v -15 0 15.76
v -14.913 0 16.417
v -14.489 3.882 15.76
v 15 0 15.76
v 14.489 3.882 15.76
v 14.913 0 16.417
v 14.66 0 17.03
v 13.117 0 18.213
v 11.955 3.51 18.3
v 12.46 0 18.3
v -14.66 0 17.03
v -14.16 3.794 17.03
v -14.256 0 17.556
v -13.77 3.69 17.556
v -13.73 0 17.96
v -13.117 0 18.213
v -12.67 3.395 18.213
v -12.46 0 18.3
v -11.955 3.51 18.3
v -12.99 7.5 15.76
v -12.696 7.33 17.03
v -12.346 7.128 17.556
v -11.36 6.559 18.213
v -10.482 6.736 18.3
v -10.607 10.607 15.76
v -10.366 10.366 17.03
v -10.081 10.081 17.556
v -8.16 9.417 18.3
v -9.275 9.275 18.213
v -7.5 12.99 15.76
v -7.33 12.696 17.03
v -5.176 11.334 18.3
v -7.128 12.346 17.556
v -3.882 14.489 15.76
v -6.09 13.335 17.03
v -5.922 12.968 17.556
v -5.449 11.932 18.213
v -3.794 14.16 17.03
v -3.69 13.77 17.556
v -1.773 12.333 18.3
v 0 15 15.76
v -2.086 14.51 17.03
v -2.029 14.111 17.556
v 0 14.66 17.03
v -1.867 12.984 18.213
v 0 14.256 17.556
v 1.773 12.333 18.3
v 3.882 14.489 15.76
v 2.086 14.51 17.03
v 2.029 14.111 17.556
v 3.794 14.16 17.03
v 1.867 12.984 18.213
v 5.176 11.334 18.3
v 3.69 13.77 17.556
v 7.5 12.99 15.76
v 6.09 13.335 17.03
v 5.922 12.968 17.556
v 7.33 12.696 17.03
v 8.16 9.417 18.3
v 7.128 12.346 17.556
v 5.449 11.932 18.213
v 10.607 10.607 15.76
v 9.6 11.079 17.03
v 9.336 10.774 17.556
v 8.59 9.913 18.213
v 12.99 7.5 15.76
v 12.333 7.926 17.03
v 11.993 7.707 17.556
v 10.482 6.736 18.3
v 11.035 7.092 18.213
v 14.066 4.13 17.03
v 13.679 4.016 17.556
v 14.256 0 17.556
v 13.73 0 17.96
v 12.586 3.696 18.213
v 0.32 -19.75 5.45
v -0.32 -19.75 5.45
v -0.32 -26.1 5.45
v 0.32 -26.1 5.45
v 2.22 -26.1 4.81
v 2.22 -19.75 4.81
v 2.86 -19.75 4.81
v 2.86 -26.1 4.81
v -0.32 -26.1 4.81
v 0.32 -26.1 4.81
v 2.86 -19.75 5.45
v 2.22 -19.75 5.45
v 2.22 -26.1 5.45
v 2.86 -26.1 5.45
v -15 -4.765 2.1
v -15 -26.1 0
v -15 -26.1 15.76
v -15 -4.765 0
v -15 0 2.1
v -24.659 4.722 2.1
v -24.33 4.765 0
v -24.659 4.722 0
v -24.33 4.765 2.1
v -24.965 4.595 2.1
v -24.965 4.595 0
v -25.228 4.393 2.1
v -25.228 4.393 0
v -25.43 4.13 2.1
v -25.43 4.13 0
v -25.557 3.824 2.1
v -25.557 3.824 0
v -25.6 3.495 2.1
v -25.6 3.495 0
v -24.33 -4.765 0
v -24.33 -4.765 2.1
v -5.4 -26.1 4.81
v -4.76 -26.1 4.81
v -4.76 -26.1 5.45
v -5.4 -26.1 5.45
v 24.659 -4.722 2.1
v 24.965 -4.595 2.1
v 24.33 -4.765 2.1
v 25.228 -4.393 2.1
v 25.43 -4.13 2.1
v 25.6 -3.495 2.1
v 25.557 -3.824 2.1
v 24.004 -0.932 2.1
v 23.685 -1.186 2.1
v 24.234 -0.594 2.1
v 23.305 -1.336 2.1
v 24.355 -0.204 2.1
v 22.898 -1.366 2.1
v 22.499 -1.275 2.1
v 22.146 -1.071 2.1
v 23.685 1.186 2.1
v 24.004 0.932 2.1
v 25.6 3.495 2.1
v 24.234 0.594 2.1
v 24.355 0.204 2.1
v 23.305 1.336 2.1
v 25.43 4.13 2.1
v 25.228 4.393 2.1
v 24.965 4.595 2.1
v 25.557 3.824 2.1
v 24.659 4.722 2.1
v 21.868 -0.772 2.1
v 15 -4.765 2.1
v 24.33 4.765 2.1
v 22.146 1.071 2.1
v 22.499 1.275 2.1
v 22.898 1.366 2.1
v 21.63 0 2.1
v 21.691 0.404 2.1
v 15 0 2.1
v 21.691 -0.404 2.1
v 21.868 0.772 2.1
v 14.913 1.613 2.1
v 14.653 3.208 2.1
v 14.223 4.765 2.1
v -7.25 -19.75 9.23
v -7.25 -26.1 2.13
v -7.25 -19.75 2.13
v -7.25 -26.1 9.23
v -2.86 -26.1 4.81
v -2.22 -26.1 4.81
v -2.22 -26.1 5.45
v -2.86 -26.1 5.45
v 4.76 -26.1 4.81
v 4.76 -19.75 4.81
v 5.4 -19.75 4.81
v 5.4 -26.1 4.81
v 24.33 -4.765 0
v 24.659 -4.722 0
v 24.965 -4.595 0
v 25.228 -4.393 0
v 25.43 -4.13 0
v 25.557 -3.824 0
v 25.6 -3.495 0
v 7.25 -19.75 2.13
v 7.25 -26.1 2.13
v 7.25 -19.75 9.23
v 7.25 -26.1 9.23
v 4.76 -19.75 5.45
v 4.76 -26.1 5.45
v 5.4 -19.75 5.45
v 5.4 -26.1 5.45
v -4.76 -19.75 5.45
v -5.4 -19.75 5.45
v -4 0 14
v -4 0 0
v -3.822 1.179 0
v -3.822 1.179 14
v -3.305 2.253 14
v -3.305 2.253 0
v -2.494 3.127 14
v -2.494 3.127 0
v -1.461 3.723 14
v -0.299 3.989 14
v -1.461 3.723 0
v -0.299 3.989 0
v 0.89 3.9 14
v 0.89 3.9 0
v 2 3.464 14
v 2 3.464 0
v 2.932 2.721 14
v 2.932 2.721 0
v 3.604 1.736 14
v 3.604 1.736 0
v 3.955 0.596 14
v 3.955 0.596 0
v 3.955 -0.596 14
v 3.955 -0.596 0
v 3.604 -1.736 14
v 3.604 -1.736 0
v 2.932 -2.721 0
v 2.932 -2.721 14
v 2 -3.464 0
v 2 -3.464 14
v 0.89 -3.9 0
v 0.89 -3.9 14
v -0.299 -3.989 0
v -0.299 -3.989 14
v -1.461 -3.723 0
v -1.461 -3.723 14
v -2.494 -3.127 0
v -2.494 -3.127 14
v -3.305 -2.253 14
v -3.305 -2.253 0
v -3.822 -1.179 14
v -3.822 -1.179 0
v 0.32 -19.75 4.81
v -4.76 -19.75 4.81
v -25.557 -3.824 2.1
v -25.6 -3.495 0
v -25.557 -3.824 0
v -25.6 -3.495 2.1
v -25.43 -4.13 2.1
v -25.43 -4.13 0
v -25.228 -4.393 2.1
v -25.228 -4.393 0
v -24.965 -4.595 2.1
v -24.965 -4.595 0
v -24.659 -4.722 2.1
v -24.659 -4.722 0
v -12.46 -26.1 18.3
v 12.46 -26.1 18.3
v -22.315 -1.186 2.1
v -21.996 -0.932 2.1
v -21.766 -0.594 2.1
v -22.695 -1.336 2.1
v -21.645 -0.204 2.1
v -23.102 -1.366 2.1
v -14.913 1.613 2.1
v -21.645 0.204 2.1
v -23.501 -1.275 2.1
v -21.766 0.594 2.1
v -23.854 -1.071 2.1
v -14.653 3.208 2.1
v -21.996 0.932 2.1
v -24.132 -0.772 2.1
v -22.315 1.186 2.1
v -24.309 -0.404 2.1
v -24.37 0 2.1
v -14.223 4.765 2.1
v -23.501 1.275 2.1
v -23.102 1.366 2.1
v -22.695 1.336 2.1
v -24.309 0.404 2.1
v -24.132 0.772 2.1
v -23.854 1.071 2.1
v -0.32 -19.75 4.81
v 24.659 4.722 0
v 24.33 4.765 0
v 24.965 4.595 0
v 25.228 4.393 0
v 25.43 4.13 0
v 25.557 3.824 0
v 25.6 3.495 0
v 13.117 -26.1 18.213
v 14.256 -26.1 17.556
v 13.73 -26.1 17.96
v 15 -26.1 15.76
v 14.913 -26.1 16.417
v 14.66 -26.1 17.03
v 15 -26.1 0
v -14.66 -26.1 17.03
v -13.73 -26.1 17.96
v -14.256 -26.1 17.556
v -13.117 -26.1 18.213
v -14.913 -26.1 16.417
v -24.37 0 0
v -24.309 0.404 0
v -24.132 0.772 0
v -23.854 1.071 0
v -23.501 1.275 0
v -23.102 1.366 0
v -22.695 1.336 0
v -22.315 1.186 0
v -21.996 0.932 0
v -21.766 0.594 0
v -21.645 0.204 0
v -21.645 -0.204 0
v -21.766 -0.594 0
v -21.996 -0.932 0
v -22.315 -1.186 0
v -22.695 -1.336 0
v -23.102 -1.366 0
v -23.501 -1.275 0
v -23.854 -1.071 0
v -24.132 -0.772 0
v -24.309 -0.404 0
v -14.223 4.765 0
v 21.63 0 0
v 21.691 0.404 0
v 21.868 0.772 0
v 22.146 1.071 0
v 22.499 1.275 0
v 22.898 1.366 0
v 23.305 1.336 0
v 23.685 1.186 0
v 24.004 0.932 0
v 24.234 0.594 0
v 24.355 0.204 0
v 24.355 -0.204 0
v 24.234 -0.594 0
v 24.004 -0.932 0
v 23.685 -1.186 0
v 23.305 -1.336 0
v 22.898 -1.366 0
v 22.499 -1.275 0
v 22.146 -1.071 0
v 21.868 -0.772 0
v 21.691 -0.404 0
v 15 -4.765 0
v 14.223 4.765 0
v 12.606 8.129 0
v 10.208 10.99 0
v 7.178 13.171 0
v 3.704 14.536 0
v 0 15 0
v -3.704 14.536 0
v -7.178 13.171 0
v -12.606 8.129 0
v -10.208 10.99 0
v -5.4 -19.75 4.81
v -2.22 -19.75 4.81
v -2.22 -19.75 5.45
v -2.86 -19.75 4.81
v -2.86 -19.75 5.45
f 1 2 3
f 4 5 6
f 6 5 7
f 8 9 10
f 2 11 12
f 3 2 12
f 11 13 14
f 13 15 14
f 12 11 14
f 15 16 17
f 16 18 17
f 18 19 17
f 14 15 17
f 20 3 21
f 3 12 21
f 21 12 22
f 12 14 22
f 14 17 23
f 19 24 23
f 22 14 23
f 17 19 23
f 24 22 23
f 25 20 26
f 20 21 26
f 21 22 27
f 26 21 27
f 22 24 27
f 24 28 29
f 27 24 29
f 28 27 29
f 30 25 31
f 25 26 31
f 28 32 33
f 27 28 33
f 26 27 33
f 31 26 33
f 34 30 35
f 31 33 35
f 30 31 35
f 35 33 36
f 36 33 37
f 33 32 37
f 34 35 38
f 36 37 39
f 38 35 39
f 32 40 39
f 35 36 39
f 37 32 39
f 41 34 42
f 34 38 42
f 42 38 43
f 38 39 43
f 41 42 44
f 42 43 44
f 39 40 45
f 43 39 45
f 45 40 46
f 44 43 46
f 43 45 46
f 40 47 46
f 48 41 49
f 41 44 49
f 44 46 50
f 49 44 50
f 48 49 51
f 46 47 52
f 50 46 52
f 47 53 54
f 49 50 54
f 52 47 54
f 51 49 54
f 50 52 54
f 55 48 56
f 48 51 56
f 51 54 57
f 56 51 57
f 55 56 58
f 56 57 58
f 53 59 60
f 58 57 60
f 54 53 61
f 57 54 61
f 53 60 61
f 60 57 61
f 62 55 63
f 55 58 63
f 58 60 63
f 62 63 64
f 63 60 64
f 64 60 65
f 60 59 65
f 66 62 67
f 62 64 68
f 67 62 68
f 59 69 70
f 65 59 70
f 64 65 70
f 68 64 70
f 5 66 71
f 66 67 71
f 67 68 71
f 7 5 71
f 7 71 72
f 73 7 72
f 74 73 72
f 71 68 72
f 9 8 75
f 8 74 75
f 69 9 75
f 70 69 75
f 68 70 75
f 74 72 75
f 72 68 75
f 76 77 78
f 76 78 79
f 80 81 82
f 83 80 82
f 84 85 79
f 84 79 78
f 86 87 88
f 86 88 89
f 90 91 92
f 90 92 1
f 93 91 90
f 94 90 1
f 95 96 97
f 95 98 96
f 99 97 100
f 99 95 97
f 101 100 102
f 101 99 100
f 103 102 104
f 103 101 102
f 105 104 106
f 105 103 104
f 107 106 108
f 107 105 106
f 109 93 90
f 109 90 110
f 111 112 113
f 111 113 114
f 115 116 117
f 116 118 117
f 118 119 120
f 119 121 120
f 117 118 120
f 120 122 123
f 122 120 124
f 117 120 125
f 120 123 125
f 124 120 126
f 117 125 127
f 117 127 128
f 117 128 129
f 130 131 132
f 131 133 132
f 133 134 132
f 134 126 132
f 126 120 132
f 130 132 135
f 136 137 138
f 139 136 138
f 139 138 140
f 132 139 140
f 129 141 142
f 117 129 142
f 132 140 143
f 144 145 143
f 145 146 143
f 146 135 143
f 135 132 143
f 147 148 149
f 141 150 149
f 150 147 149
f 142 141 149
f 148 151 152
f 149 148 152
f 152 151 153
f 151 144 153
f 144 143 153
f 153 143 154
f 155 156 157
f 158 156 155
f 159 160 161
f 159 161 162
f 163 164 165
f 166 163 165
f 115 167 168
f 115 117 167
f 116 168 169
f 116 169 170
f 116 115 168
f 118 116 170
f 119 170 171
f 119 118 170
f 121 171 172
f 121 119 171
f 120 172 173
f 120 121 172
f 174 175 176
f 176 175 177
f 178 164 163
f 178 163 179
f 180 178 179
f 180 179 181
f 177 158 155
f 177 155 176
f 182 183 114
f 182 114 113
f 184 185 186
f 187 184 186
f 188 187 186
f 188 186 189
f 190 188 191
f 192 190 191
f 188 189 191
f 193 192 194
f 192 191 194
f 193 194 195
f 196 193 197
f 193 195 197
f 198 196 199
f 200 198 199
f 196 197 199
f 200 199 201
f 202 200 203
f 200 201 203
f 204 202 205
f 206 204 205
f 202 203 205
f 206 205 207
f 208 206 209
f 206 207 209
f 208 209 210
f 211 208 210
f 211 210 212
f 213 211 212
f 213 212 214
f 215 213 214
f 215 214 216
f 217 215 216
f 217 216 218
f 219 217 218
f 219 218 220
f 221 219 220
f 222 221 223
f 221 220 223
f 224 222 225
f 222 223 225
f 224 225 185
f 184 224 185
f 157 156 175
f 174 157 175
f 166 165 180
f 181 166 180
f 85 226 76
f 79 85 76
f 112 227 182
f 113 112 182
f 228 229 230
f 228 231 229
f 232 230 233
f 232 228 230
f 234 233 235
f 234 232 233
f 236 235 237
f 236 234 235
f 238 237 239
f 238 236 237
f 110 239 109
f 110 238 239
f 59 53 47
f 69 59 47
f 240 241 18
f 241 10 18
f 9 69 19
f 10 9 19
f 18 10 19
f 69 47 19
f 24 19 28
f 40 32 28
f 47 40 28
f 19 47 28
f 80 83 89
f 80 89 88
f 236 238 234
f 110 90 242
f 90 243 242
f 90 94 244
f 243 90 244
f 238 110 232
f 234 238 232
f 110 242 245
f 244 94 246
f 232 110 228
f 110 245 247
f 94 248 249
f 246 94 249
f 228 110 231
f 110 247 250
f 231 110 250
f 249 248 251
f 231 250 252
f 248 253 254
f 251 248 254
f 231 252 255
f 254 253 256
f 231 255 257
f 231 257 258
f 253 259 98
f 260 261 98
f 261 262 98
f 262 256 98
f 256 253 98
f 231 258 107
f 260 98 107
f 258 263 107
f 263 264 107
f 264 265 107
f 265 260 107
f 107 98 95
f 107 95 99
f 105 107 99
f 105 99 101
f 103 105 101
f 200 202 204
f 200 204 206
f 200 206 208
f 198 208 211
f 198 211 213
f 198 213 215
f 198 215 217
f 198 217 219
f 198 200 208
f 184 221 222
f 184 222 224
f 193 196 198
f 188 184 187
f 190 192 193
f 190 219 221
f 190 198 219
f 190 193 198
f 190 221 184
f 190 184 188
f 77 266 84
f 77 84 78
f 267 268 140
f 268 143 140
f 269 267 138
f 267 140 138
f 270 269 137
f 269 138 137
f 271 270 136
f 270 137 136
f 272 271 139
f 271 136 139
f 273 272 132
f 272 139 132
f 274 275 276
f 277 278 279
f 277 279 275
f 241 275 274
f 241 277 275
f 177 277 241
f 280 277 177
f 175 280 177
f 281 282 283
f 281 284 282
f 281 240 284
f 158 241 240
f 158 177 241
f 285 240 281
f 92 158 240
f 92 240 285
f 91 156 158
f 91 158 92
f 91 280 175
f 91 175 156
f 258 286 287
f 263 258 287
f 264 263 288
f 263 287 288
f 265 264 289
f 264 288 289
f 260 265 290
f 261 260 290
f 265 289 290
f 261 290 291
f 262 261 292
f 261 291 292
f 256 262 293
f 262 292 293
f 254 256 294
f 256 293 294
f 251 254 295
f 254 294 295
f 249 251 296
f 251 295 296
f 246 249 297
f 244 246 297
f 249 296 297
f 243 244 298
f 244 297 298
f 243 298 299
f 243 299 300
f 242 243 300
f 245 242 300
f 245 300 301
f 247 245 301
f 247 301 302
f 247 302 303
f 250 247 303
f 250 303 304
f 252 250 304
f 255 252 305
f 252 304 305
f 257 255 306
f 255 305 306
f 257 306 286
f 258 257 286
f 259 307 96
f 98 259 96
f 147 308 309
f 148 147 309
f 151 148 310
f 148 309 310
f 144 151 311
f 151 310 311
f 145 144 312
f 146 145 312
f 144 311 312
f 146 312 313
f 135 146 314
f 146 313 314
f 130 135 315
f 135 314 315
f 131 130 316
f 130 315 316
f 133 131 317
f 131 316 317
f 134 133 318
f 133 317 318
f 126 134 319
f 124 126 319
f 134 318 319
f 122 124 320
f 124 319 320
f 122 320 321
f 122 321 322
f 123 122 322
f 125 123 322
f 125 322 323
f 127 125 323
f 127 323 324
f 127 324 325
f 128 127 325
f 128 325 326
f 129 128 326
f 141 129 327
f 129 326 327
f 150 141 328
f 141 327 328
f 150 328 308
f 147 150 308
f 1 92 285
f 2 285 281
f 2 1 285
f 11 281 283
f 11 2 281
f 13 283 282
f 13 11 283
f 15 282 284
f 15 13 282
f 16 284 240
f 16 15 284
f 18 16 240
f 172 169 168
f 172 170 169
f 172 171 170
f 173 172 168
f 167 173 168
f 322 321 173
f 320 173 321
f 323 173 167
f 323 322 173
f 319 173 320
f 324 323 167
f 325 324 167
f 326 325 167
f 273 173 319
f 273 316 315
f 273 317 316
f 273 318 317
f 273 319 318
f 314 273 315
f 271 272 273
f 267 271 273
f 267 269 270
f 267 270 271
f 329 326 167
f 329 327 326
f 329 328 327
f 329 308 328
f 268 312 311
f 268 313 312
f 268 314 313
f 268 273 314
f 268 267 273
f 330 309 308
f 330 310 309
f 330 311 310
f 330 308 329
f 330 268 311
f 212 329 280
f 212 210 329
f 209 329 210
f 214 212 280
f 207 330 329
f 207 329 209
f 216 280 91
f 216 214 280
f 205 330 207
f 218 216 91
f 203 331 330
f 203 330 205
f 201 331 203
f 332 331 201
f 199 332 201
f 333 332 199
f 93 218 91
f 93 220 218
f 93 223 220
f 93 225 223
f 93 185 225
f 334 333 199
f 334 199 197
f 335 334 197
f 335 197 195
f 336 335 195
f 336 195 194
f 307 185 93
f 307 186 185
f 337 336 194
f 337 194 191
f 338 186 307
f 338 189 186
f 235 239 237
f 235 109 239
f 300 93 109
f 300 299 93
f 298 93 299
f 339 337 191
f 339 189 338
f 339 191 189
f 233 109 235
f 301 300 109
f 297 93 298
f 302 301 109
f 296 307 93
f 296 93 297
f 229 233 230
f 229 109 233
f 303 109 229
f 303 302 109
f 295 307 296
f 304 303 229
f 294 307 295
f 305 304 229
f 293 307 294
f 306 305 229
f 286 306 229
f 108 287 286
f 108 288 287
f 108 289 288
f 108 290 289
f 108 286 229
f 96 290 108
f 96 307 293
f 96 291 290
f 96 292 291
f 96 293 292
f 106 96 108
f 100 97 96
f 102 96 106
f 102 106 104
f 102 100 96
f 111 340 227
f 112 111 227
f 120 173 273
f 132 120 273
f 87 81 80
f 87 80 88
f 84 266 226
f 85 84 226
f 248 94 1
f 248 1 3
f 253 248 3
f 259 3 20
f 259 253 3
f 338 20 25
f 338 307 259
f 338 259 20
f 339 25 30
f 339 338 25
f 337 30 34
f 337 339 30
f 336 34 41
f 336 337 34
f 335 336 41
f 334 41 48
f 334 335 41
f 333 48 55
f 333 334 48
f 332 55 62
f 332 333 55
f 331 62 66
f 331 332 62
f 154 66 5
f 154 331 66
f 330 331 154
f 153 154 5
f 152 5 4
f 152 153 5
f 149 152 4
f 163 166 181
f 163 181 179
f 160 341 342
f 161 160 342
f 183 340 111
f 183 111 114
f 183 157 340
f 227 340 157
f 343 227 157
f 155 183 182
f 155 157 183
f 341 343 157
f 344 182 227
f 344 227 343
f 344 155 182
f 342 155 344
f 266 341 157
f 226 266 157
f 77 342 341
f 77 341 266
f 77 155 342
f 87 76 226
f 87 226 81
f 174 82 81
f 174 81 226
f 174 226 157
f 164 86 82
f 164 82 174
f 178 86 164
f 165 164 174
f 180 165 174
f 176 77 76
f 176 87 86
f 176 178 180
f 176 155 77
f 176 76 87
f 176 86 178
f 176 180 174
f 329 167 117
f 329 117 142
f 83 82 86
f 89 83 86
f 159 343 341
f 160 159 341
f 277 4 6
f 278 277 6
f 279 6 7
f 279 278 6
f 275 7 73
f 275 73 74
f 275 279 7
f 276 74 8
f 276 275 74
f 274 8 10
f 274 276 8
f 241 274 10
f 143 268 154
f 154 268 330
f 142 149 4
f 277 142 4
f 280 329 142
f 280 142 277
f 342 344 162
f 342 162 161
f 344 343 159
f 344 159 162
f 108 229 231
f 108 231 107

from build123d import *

# Parameters (mm, degrees)
BOSS_EXTRUDE1_DEPTH = 18.3
FILLET1_R           = 2.54
SKETCH2_W           = 13.138787008
SKETCH2_H           = 9.53
SKETCH2_R           = 1.37
BOSS_EXTRUDE2_DEPTH = 2.1
FILLET2_R           = 1.27
SKETCH3_R           = 4
CUT_EXTRUDE1_DEPTH  = 14
SKETCH4_W           = 14.5
SKETCH4_H           = 7.1
SKETCH4_W_2         = 0.64
SKETCH4_H_2         = 0.64
CUT_EXTRUDE2_DEPTH  = 6.35


with BuildPart() as part:
    # Sketch1 → Boss-Extrude1 (new body)
    with BuildSketch(Plane.XY):
        with BuildLine():
            Line((15, 0), (15, -26.1))
            Line((15, -26.1), (-15, -26.1))
            Line((-15, -26.1), (-15, 0))
            ThreePointArc((-15, 0), (0, 15), (15, 0))
        make_face()
    extrude(amount=BOSS_EXTRUDE1_DEPTH)

    # Fillet1
    fillet1_edges = [part.edges().sort_by_distance(p)[0] for p in [
        (15, -13.05, 18.3),
        (0, 15, 18.3),
        (-15, -13.05, 18.3),
    ]]
    fillet(fillet1_edges, radius=FILLET1_R)

    # Sketch2 → Boss-Extrude2 (add)
    with BuildSketch(Plane(origin=(0, 0, 0), x_dir=(-1, 0, 0), z_dir=(0, 0, -1))):
        with Locations((19.030606496, 0)):
            Rectangle(SKETCH2_W, SKETCH2_H)
        with Locations((23, 0)):
            Circle(SKETCH2_R, mode=Mode.SUBTRACT)
        with Locations((-19.030606496, 0)):
            Rectangle(SKETCH2_W, SKETCH2_H)
        with Locations((-23, 0)):
            Circle(SKETCH2_R, mode=Mode.SUBTRACT)
    extrude(amount=-BOSS_EXTRUDE2_DEPTH)

    # Fillet2
    fillet2_edges = [part.edges().sort_by_distance(p)[0] for p in [
        (-25.6, -4.765, 1.05),
        (-25.6, 4.765, 1.05),
        (25.6, 4.765, 1.05),
        (25.6, -4.765, 1.05),
    ]]
    fillet(fillet2_edges, radius=FILLET2_R)

    # Sketch3 → Cut-Extrude1 (cut)
    with BuildSketch(Plane(origin=(0, 0, 0), x_dir=(-1, 0, 0), z_dir=(0, 0, -1))):
        Circle(SKETCH3_R)
    extrude(amount=-CUT_EXTRUDE1_DEPTH, mode=Mode.SUBTRACT)

    # Sketch4 → Cut-Extrude2 (cut)
    with BuildSketch(Plane.XZ.offset(26.1)):
        with Locations((0, 5.68)):
            Rectangle(SKETCH4_W, SKETCH4_H)
        with Locations((-5.08, 5.13)):
            Rectangle(SKETCH4_W_2, SKETCH4_H_2, mode=Mode.SUBTRACT)
        with Locations((-2.54, 5.13)):
            Rectangle(SKETCH4_W_2, SKETCH4_H_2, mode=Mode.SUBTRACT)
        with Locations((0, 5.13)):
            Rectangle(SKETCH4_W_2, SKETCH4_H_2, mode=Mode.SUBTRACT)
        with Locations((2.54, 5.13)):
            Rectangle(SKETCH4_W_2, SKETCH4_H_2, mode=Mode.SUBTRACT)
        with Locations((5.08, 5.13)):
            Rectangle(SKETCH4_W_2, SKETCH4_H_2, mode=Mode.SUBTRACT)
    extrude(amount=-CUT_EXTRUDE2_DEPTH, mode=Mode.SUBTRACT)


solid = part.part
